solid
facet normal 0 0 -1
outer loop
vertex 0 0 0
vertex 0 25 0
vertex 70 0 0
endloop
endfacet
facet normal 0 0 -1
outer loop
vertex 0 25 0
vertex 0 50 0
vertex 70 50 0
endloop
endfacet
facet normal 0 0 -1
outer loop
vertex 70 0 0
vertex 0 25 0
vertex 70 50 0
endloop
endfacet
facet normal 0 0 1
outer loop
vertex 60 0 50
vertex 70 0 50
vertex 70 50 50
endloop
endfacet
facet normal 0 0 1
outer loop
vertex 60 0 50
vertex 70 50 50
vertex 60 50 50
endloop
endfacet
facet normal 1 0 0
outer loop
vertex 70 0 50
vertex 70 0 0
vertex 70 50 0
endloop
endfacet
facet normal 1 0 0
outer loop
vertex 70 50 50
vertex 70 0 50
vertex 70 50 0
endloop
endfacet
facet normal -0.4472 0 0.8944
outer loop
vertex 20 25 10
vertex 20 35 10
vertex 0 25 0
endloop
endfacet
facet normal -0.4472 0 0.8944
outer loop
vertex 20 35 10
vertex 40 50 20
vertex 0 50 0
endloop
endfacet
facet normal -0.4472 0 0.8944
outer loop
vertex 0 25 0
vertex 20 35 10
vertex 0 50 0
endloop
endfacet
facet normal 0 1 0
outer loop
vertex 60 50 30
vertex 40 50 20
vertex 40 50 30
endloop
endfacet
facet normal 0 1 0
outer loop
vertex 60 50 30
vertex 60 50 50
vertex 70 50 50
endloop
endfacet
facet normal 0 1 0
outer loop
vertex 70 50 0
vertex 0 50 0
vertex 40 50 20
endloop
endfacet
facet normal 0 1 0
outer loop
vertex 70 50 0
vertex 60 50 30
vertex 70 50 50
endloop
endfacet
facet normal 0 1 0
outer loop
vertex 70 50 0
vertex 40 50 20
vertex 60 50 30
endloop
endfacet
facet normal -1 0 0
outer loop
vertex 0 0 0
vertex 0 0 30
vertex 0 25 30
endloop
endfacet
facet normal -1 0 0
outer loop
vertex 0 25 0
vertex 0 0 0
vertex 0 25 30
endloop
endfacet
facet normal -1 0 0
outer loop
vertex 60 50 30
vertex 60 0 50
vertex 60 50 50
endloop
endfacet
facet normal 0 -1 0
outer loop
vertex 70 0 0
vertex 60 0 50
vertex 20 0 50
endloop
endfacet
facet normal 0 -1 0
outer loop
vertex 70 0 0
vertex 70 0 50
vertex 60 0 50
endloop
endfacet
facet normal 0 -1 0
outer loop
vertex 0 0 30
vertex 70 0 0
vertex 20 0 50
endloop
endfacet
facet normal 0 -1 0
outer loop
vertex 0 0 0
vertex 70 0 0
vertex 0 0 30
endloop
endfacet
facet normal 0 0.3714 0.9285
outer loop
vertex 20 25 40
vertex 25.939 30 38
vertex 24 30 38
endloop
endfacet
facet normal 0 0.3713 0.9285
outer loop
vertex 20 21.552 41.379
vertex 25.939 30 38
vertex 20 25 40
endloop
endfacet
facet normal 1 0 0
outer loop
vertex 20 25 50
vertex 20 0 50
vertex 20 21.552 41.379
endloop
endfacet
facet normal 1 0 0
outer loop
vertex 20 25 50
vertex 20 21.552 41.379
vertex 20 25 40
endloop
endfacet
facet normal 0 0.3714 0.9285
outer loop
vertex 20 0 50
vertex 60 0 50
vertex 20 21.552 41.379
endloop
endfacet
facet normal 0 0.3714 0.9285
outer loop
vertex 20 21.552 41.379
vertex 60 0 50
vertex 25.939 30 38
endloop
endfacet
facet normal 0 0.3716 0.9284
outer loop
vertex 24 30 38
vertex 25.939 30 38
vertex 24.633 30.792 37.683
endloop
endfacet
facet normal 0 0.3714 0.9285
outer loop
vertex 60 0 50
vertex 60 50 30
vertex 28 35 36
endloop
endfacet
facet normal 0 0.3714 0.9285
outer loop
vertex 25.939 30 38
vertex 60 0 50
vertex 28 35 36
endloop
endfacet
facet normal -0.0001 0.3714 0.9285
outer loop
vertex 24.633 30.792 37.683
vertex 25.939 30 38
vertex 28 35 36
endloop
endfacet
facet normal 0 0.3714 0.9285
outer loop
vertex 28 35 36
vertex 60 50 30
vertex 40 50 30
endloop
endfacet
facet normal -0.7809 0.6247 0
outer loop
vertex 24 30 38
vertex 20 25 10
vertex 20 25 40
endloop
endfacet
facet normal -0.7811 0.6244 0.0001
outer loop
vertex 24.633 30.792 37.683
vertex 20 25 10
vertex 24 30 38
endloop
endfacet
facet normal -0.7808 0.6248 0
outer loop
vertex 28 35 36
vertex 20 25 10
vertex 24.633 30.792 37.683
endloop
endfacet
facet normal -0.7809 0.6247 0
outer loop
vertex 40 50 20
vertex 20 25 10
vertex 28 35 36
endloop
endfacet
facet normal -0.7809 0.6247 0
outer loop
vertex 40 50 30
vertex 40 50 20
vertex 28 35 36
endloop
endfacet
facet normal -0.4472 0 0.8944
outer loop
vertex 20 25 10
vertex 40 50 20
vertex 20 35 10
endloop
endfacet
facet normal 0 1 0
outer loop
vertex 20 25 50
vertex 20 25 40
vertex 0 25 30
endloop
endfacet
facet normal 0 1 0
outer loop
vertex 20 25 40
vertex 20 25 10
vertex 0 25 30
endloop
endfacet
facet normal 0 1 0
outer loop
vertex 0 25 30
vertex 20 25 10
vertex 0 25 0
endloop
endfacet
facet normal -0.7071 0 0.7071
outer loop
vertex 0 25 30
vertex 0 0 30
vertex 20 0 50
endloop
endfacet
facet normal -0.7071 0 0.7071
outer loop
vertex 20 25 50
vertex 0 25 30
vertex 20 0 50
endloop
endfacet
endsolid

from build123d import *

# Parameters (mm, degrees)
SKETCH1_W            = 70
SKETCH1_H            = 50
BOSS_EXTRUDE1_DEPTH  = 50
CUT_EXTRUDE1_DEPTH   = 50
CUT_EXTRUDE2_DEPTH   = 20
CUT_EXTRUDE3_DEPTH   = 20
CUT_EXTRUDE4_DEPTH   = 5
BOSS_EXTRUDE2_DEPTH  = 25
CUT_EXTRUDE5_DEPTH   = 25
BOSS_EXTRUDE3_DEPTH  = 30
BOSS_EXTRUDE4_DEPTH  = 50
CUT_EXTRUDE7_DEPTH   = 15
CUT_EXTRUDE8_DEPTH   = 15
BOSS_EXTRUDE5_DEPTH  = 15
CUT_EXTRUDE12_DEPTH  = 15
CUT_EXTRUDE13_DEPTH  = 15
BOSS_EXTRUDE6_DEPTH  = 15
SKETCH22_W           = 70
SKETCH22_H           = 50
CUT_EXTRUDE15_DEPTH  = 15
BOSS_EXTRUDE11_DEPTH = 15
CUT_EXTRUDE18_DEPTH  = 15
CUT_EXTRUDE19_DEPTH  = 15
BOSS_EXTRUDE14_DEPTH = 15
BOSS_EXTRUDE17_DEPTH = 25
BOSS_EXTRUDE18_DEPTH = 25


with BuildPart() as part:
    # Sketch1 → Boss-Extrude1 (new body)
    with BuildSketch(Plane.XY):
        with Locations((35, 25)):
            Rectangle(SKETCH1_W, SKETCH1_H)
    extrude(amount=BOSS_EXTRUDE1_DEPTH)

    # Sketch2 → Cut-Extrude1 (cut)
    with BuildSketch(Plane.XZ):
        Polygon((0, 30), (20, 50), (0, 50), align=None)
    extrude(amount=-CUT_EXTRUDE1_DEPTH, mode=Mode.SUBTRACT)

    # Sketch3 → Cut-Extrude2 (cut)
    with BuildSketch(Plane.XY.offset(50)):
        Polygon((60, 0), (60, 50), (40, 50), (20, 30), (20, 0), align=None)
    extrude(amount=-CUT_EXTRUDE2_DEPTH, mode=Mode.SUBTRACT)

    # Sketch4 → Cut-Extrude3 (cut)
    with BuildSketch(Plane(origin=(0, 50, 0), x_dir=(1, 0, 0), z_dir=(0, 1, 0))):
        Polygon((40, -30), (20, -50), (0, -30), (0, 0), (40, -20), align=None)
    extrude(amount=-CUT_EXTRUDE3_DEPTH, mode=Mode.SUBTRACT)

    # Sketch5 → Cut-Extrude4 (cut)
    with BuildSketch(Plane(origin=(0, 30, 0), x_dir=(1, 0, 0), z_dir=(0, 1, 0))):
        Polygon((0, 0), (0, -30), (20, -50), (20, -30), (40, -30), (40, -20), align=None)
    extrude(amount=-CUT_EXTRUDE4_DEPTH, mode=Mode.SUBTRACT)

    # Sketch6 → Boss-Extrude2 (add)
    with BuildSketch(Plane(origin=(0, 25, 0), x_dir=(1, 0, 0), z_dir=(0, 1, 0))):
        Polygon((20, -10), (20, -30), (40, -30), (40, -20), align=None)
    extrude(amount=BOSS_EXTRUDE2_DEPTH)

    # Sketch7 → Cut-Extrude5 (cut)
    with BuildSketch(Plane(origin=(0, 50, 0), x_dir=(1, 0, 0), z_dir=(0, 1, 0))):
        Polygon((20, -50), (40, -50), (40, -30), align=None)
    extrude(amount=-CUT_EXTRUDE5_DEPTH, mode=Mode.SUBTRACT)

    # Sketch8 → Boss-Extrude3 (add)
    with BuildSketch(Plane.XZ):
        Polygon((20, 50), (20, 40), (40, 30), (60, 30), (60, 50), align=None)
    extrude(amount=-BOSS_EXTRUDE3_DEPTH)

    # Sketch9 → Boss-Extrude4 (add)
    with BuildSketch(Plane(origin=(0, 50, 0), x_dir=(1, 0, 0), z_dir=(0, 1, 0))):
        Polygon((20, -40), (40, -30), (20, -30), align=None)
    extrude(amount=-BOSS_EXTRUDE4_DEPTH)

    # Sketch10 → Cut-Extrude7 (cut)
    with BuildSketch(Plane(origin=(0, 50, 0), x_dir=(1, 0, 0), z_dir=(0, 1, 0))):
        Polygon((20, -40), (40, -30), (40, -20), (20, -10), align=None)
    extrude(amount=-CUT_EXTRUDE7_DEPTH, mode=Mode.SUBTRACT)

    # Sketch11 → Cut-Extrude8 (cut)
    with BuildSketch(Plane(origin=(0, 17.24137931, 43.103448276), x_dir=(1, 0, 0), z_dir=(0, 0.371390676, 0.928476691))):
        Polygon((60, 35.282114254), (60, -18.569533818), (20, -18.569533818), (20, 4.642383454), (40, 35.282114254), align=None)
    extrude(amount=CUT_EXTRUDE8_DEPTH, mode=Mode.SUBTRACT)

    # Sketch12 → Boss-Extrude5 (add)
    with BuildSketch(Plane(origin=(0, 17.24137931, 43.103448276), x_dir=(1, 0, 0), z_dir=(0, 0.371390676, 0.928476691))):
        Polygon((40, 35.282114254), (60, 35.282114254), (60, -18.569533818), (20, -18.569533818), (20, 4.642383454), align=None)
    extrude(amount=-BOSS_EXTRUDE5_DEPTH)

    # Sketch13 → Cut-Extrude12 (cut)
    with BuildSketch(Plane(origin=(11.899549259, -7.211848036, 2.884739214), x_dir=(0.173608446, -0.10521724, -0.979177941), z_dir=(0.837390852, -0.507509607, 0.203003843))):
        Polygon((-48.11715912, 31.745980111), (-48.11715912, 37.592580529), (-35.861981078, 39.10036734), (-39.313151906, 28.797022071), align=None)
    extrude(amount=-CUT_EXTRUDE12_DEPTH, mode=Mode.SUBTRACT)

    # Sketch15 → Cut-Extrude13 (cut)
    with BuildSketch(Plane(origin=(0, 17.24137931, 43.103448276), x_dir=(1, 0, 0), z_dir=(0, 0.371390676, 0.928476691))):
        Polygon((40, 35.282114254), (20, 35.282114254), (20, -18.569533818), align=None)
    extrude(amount=CUT_EXTRUDE13_DEPTH, mode=Mode.SUBTRACT)

    # Sketch16 → Boss-Extrude6 (add)
    with BuildSketch(Plane(origin=(0, 17.24137931, 43.103448276), x_dir=(1, 0, 0), z_dir=(0, 0.371390676, 0.928476691))):
        Polygon((25.939393939, 13.741455025), (28, 19.126619832), (24, 13.741455025), align=None)
        Polygon((28, 19.126619832), (25.939393939, 13.741455025), (29.454545455, 19.126619832), align=None)
    extrude(amount=-BOSS_EXTRUDE6_DEPTH)

    # Sketch22 → Cut-Extrude15 (cut)
    with BuildSketch(Plane(origin=(0, 0, 0), x_dir=(-1, 0, 0), z_dir=(0, -1, 0))):
        with Locations((-35, -25)):
            Rectangle(SKETCH22_W, SKETCH22_H)
    extrude(amount=CUT_EXTRUDE15_DEPTH, mode=Mode.SUBTRACT)

    # Sketch28 → Boss-Extrude11 (add)
    with BuildSketch(Plane(origin=(-9.6, 12.8, 0), x_dir=(0.8, 0.6, 0), z_dir=(-0.6, 0.8, 0))):
        Polygon((37, -36), (62, -30), (62, -20), (37, -10), align=None)
    extrude(amount=-BOSS_EXTRUDE11_DEPTH)

    # Sketch29 → Cut-Extrude18 (cut)
    with BuildSketch(Plane(origin=(0, 0, 0), x_dir=(0, 0, -1), z_dir=(0.780868809, -0.624695048, 0))):
        Polygon((-40, 32.015621187), (-30, 64.031242374), (-20, 64.031242374), (-10, 32.015621187), align=None)
    extrude(amount=-CUT_EXTRUDE18_DEPTH, mode=Mode.SUBTRACT)

    # Sketch30 → Cut-Extrude19 (cut)
    with BuildSketch(Plane(origin=(0, 0, 0), x_dir=(0.894427191, 0, 0.447213595), z_dir=(-0.447213595, 0, 0.894427191))):
        Polygon((0, 50), (44.72135955, 50), (22.360679775, 25), (0, 25), align=None)
    extrude(amount=CUT_EXTRUDE19_DEPTH, mode=Mode.SUBTRACT)

    # Sketch32 → Boss-Extrude14 (add)
    with BuildSketch(Plane(origin=(0, 17.24137931, 43.103448276), x_dir=(1, 0, 0), z_dir=(0, 0.371390676, 0.928476691))):
        Polygon((28, 19.126619832), (40, 35.282114254), (29.454545455, 19.126619832), align=None)
    extrude(amount=-BOSS_EXTRUDE14_DEPTH)

    # Sketch34 → Boss-Extrude17 (add)
    with BuildSketch(Plane(origin=(0, 25, 0), x_dir=(1, 0, 0), z_dir=(0, 1, 0))):
        Polygon((14.310344828, -40), (20, -40), (20, -50), align=None)
    extrude(amount=-BOSS_EXTRUDE17_DEPTH)

    # Sketch35 → Boss-Extrude18 (add)
    with BuildSketch(Plane(origin=(0, 0, 0), x_dir=(0, 0, 1), z_dir=(-0.780868809, 0.624695048, 0))):
        Polygon((30, 64.031242374), (40, 32.015621187), (10, 32.015621187), (20, 64.031242374), align=None)
    extrude(amount=-BOSS_EXTRUDE18_DEPTH)


solid = part.part
